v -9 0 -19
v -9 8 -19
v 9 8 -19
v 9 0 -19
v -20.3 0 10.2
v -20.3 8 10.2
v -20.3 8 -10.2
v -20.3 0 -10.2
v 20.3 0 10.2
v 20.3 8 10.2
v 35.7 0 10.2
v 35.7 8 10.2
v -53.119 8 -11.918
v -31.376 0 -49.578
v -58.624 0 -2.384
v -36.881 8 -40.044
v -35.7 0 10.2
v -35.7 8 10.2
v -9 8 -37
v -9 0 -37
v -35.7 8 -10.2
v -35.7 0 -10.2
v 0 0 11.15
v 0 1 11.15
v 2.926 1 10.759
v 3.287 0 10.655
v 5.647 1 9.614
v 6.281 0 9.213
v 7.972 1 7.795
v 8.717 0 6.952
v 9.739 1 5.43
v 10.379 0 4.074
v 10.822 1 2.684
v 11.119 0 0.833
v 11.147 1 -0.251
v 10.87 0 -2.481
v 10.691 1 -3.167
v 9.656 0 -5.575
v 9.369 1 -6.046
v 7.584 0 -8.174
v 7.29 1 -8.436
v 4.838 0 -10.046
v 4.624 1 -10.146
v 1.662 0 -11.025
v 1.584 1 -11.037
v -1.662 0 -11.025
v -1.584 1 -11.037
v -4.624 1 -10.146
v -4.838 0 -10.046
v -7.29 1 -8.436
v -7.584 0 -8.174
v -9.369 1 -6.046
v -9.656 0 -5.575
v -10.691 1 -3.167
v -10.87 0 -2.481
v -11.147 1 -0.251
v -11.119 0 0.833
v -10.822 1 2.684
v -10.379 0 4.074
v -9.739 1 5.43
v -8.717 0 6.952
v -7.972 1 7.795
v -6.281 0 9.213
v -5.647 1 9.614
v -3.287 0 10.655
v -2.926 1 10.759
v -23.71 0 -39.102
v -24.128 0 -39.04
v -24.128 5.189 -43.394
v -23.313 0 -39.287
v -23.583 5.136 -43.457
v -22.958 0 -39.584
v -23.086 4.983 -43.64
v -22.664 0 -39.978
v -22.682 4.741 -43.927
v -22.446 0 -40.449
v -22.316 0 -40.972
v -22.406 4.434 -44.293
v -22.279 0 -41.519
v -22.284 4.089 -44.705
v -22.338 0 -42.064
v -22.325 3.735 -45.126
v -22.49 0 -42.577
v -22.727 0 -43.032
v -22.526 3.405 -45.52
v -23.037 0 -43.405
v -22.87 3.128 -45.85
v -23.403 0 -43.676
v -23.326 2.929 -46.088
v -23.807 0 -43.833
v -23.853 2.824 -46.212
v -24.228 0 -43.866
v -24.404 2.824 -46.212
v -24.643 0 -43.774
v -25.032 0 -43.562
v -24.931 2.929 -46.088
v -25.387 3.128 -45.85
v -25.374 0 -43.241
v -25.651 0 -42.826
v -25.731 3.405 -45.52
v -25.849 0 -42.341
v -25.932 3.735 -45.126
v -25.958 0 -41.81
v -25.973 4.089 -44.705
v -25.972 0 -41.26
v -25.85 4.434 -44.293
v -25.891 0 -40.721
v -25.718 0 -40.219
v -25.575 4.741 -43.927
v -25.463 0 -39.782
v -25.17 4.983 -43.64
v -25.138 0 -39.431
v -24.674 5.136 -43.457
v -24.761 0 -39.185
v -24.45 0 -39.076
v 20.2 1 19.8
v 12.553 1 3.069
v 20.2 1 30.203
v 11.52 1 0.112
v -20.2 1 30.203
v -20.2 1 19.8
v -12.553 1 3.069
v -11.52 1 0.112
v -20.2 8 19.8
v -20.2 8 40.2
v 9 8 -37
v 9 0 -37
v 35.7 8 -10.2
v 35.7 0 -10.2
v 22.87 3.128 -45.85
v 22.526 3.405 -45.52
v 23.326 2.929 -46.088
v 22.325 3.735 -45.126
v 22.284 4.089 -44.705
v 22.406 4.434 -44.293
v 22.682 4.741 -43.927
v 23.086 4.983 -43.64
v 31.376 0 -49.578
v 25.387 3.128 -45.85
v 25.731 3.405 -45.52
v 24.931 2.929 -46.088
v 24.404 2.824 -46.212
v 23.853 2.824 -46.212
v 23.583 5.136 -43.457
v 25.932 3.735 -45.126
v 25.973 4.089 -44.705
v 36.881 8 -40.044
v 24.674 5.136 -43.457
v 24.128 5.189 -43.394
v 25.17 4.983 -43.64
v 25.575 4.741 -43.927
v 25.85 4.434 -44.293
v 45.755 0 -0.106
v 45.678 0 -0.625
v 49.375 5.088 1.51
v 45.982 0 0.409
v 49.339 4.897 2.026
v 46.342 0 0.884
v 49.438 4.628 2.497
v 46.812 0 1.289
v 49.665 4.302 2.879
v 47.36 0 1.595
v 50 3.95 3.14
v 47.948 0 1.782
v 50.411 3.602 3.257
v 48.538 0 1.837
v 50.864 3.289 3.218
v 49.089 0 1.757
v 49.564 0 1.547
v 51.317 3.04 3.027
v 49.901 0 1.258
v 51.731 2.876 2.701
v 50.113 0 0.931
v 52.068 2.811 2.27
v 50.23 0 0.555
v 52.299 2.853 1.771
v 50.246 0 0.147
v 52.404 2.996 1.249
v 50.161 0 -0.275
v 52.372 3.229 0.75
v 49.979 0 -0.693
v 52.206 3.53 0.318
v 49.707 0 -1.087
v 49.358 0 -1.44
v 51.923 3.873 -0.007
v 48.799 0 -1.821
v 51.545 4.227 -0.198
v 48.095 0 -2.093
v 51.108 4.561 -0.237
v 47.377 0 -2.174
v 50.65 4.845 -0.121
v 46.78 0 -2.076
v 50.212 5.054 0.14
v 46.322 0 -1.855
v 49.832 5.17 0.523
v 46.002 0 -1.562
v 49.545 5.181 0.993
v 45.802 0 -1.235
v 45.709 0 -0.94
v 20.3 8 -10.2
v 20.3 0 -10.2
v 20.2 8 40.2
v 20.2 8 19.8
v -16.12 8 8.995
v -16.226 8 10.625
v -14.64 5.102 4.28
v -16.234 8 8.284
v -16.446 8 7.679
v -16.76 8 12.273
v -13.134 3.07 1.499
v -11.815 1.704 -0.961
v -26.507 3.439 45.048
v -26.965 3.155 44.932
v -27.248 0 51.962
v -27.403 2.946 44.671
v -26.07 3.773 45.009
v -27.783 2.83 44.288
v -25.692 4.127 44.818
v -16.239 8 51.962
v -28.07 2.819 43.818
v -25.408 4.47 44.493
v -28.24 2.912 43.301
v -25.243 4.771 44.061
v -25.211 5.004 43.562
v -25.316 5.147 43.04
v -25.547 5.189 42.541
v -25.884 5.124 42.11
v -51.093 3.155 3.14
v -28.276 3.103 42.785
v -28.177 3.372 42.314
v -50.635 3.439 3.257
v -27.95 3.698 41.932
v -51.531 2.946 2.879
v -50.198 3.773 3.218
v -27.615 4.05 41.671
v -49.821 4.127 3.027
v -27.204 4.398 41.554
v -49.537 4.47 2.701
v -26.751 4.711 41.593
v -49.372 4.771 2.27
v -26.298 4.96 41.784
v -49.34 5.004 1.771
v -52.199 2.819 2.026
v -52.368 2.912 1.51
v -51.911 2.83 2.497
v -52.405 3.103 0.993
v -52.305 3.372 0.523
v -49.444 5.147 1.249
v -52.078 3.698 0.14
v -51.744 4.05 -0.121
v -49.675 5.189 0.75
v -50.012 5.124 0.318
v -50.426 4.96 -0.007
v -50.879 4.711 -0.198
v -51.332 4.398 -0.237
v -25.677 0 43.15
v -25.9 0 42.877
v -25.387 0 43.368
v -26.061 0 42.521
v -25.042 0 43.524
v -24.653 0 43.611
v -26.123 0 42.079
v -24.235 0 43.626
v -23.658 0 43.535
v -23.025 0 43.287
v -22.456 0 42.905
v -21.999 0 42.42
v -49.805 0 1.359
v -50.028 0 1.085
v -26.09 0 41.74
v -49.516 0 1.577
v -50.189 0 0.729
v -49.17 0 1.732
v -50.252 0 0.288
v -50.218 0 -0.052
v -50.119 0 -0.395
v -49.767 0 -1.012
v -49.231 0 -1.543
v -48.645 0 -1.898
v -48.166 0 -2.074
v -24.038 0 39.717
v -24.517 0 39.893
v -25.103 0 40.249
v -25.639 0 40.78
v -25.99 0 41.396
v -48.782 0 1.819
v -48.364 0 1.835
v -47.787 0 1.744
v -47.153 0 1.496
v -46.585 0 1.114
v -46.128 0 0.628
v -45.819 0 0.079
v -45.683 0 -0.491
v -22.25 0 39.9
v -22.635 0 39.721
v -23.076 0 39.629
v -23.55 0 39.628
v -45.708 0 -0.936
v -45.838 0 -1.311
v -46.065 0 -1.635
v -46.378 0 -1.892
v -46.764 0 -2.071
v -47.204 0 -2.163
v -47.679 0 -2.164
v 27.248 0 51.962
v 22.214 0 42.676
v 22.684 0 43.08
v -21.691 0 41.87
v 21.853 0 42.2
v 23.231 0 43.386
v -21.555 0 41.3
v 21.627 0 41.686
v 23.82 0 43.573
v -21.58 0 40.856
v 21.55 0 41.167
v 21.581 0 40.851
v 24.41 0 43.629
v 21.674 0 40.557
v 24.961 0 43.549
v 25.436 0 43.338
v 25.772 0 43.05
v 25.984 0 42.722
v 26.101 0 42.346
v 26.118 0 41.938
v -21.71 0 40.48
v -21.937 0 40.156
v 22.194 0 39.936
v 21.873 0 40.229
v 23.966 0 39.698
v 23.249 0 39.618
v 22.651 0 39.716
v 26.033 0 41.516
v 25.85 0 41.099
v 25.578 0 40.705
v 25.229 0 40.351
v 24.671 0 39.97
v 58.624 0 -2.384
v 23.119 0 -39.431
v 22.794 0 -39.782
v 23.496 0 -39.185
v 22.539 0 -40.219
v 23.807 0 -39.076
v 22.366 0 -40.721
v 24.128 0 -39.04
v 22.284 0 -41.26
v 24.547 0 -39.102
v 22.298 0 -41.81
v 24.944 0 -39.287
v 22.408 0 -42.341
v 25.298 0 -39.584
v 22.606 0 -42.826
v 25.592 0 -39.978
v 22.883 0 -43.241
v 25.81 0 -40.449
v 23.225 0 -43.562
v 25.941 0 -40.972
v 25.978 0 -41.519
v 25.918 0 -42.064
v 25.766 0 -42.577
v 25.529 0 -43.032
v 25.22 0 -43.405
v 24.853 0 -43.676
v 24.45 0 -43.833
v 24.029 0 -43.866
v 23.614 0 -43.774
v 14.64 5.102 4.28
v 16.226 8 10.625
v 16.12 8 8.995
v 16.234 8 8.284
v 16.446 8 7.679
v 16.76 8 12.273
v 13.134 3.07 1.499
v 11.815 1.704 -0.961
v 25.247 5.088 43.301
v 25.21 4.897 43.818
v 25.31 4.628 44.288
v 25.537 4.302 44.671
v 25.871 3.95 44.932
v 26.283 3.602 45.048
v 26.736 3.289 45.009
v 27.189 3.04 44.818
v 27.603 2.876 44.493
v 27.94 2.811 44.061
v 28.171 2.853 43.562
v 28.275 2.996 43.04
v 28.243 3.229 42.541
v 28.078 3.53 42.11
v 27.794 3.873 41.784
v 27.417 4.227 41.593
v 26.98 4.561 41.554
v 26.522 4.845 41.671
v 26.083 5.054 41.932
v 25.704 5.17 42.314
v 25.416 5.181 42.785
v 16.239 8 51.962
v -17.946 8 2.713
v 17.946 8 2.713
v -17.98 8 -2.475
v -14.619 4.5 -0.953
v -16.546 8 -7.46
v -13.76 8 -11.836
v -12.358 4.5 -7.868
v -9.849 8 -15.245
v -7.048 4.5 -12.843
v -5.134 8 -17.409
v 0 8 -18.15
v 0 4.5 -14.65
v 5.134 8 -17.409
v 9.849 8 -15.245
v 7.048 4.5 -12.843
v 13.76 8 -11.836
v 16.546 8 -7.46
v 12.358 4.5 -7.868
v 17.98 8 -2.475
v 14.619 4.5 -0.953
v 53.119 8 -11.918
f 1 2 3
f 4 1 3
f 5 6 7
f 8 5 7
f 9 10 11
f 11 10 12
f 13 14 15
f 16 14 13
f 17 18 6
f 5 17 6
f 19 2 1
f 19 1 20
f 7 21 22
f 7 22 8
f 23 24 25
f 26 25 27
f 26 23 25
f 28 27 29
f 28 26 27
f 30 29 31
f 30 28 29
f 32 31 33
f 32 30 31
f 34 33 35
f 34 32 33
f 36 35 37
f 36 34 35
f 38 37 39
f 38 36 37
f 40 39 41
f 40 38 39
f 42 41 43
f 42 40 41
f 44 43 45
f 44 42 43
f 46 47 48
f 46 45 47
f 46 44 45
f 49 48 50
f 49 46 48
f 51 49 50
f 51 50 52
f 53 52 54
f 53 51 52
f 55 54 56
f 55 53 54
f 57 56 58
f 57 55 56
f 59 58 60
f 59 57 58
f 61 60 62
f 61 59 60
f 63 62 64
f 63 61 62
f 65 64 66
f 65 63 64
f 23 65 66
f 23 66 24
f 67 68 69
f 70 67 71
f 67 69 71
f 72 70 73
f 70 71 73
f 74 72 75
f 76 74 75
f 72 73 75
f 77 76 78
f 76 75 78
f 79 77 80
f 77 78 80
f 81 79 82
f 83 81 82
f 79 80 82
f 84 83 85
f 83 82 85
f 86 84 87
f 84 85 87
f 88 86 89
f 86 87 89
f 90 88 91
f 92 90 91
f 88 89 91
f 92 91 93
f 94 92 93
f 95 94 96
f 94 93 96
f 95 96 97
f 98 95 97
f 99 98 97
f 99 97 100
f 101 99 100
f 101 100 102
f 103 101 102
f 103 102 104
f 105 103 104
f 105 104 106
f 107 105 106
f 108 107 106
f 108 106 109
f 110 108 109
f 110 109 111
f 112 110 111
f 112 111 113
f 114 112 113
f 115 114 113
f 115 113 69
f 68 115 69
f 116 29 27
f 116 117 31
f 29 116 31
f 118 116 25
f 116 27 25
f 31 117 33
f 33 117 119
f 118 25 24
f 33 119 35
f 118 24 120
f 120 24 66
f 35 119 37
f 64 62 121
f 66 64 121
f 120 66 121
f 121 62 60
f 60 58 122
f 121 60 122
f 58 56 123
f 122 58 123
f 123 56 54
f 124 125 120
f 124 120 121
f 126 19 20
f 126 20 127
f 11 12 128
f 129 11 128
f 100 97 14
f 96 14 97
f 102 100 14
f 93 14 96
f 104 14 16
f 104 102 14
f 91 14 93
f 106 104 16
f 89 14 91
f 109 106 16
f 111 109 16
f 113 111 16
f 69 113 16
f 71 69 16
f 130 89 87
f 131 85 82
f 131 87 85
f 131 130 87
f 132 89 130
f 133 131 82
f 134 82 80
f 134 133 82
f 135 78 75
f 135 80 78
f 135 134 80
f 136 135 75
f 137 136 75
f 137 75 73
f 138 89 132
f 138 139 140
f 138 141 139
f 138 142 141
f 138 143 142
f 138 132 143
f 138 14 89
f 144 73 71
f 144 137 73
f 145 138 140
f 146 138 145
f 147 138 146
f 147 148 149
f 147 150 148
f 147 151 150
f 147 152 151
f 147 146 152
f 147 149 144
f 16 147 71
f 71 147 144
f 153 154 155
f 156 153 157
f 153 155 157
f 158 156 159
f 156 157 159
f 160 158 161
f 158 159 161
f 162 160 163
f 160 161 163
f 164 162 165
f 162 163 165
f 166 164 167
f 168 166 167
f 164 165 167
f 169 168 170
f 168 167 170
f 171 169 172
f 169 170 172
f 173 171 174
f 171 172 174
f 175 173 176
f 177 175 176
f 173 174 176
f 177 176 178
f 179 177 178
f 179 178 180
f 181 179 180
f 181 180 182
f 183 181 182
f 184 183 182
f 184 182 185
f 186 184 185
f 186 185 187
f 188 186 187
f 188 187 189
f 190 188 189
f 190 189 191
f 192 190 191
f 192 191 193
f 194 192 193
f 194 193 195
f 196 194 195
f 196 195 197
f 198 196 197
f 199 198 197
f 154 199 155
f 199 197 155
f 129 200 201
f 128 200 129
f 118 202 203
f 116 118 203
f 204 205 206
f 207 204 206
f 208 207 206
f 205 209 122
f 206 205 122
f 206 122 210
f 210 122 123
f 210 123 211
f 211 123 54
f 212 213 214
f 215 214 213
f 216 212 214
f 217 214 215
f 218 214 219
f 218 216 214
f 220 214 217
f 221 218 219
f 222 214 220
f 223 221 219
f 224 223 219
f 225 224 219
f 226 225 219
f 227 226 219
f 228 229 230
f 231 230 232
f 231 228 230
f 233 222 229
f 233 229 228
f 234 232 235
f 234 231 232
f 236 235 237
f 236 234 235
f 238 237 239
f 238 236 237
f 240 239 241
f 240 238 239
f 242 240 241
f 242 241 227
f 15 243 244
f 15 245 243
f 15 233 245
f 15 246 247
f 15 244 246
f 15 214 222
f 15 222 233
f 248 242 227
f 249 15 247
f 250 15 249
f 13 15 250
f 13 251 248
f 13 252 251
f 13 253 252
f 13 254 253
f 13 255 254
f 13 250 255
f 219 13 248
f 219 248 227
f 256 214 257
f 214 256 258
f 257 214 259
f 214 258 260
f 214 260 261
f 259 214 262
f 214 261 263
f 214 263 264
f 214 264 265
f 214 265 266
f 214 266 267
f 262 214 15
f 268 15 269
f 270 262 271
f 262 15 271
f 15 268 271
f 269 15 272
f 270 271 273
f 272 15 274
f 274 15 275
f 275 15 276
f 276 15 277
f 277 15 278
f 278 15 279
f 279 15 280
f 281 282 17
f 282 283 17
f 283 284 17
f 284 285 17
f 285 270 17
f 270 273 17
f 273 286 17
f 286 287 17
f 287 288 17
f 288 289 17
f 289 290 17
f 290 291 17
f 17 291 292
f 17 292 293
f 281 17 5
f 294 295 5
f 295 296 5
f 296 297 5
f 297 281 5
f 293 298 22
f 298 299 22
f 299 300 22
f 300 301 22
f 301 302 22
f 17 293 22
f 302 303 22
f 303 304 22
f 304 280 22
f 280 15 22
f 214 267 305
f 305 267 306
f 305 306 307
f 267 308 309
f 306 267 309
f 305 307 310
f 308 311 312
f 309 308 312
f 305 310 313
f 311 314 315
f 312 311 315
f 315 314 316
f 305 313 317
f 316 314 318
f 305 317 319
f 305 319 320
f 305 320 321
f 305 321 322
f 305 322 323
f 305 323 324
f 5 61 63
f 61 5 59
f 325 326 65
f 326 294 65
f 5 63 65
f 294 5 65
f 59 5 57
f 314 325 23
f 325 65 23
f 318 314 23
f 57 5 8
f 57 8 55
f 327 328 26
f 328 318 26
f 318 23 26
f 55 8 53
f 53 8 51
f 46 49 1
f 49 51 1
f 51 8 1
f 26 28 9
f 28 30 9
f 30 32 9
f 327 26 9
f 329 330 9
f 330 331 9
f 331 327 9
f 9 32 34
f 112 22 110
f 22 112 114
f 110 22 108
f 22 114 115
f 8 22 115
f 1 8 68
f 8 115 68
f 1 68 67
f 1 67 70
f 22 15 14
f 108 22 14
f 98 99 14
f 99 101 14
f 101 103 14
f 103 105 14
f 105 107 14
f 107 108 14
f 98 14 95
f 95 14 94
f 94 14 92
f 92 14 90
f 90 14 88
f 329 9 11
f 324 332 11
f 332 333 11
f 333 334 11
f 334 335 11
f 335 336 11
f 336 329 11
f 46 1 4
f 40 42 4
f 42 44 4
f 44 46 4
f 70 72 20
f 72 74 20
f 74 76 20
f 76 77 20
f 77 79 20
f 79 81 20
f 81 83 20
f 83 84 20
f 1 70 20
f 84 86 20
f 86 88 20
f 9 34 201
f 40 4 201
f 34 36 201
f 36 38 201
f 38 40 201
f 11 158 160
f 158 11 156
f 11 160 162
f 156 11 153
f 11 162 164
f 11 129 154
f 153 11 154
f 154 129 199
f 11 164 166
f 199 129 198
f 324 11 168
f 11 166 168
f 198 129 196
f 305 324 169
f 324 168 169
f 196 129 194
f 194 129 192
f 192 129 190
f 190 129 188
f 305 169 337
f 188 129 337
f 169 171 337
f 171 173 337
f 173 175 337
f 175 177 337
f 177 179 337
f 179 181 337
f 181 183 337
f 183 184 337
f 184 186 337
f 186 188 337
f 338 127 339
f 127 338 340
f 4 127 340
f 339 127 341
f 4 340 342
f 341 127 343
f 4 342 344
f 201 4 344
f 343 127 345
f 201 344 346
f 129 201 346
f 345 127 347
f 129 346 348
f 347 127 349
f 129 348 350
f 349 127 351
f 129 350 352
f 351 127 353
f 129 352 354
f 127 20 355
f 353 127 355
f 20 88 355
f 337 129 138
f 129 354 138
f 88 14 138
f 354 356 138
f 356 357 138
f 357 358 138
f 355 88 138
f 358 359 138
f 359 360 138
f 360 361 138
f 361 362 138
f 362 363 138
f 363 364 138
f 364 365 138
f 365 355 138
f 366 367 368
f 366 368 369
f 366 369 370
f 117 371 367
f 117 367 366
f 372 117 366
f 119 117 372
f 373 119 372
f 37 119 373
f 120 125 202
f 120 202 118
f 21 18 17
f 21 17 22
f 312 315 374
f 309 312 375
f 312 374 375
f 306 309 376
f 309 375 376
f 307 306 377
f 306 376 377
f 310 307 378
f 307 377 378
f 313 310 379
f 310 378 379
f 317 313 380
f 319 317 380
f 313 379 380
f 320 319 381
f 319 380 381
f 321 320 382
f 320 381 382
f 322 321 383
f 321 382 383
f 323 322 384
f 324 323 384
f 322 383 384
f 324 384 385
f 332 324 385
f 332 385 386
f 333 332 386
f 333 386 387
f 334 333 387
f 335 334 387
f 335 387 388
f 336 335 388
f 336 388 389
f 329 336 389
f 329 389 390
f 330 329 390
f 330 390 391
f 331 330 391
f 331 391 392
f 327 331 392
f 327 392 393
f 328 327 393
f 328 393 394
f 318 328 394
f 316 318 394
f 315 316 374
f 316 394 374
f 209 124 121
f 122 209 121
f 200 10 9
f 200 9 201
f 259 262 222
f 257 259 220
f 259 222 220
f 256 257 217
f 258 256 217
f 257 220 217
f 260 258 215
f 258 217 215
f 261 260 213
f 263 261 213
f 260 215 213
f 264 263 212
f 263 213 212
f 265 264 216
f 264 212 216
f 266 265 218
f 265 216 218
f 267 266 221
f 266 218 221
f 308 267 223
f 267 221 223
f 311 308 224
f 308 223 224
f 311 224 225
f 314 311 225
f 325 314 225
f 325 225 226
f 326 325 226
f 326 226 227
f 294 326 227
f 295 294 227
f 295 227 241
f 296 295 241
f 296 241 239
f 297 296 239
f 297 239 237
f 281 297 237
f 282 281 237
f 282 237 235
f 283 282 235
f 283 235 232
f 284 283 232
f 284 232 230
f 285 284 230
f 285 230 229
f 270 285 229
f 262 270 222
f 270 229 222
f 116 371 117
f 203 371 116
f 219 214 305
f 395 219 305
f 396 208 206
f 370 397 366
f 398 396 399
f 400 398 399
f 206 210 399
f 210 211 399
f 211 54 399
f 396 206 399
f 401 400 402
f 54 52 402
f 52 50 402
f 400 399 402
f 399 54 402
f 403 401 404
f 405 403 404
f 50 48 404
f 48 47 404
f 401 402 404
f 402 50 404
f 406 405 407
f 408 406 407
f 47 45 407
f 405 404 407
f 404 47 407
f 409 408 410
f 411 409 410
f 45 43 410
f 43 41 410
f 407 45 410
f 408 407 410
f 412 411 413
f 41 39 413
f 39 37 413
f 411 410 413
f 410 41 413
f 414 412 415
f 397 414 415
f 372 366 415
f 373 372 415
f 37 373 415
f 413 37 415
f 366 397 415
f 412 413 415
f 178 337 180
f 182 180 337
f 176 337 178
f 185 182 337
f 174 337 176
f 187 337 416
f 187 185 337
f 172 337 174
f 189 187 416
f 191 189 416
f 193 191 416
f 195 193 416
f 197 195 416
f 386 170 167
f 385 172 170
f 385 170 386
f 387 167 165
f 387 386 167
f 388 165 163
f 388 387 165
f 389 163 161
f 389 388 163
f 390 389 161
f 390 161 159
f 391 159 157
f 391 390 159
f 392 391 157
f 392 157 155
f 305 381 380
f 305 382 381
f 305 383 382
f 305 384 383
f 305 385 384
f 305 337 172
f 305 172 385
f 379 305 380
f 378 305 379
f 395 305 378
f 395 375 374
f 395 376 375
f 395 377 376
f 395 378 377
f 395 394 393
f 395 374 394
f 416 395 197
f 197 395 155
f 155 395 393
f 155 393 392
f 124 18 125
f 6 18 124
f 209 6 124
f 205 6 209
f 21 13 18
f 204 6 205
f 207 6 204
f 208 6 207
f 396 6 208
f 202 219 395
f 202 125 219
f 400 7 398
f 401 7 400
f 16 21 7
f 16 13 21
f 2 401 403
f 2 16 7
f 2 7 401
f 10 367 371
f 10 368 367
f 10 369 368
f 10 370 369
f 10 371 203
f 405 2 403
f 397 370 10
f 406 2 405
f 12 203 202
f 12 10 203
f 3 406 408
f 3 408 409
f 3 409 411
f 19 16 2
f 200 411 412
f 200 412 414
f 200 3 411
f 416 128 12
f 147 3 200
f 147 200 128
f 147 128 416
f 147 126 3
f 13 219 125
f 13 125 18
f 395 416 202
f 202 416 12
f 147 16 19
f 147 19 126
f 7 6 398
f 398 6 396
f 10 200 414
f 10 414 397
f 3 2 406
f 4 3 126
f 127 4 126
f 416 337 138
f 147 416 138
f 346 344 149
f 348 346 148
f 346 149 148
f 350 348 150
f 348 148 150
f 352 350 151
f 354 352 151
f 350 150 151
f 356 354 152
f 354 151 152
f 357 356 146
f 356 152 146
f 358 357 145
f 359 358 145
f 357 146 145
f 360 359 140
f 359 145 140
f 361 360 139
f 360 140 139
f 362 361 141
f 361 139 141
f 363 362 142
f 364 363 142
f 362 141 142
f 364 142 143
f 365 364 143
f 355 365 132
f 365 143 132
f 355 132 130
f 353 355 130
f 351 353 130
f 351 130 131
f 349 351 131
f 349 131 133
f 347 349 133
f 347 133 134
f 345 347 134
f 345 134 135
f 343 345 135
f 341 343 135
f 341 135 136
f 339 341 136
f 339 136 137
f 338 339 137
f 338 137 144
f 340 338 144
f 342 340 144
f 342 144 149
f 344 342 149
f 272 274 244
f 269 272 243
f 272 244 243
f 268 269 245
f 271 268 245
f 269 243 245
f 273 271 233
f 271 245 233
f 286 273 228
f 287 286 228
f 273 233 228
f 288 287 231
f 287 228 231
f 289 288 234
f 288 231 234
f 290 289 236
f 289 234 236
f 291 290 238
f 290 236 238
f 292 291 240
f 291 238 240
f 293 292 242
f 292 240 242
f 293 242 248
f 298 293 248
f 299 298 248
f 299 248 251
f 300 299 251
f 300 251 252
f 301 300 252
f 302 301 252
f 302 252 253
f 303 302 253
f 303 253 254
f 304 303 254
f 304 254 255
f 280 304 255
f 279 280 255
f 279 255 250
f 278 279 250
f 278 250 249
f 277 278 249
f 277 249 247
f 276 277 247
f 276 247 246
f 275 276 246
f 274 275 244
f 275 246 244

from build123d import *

# Parameters (mm, degrees)
BOSS_EXTRUDE1_DEPTH = 8
CHAMFER1_SIZE       = 10
CHAMFER1_SIZE_2     = 11.917535926
SKETCH4_R           = 1.85
CUT_EXTRUDE1_DEPTH  = 101.029376687
SKETCH5_R           = 11.15
CUT_EXTRUDE3_DEPTH  = 79.744901298
SKETCH6_R           = 1.85
CUT_EXTRUDE4_DEPTH  = 101.029376687
SKETCH7_R           = 1.85
CUT_EXTRUDE5_DEPTH  = 97.338690096
SKETCH8_W           = 15.4
SKETCH8_H           = 20.4
CUT_EXTRUDE6_DEPTH  = 79.744901298
SKETCH9_W           = 40.4
SKETCH9_H           = 10.4
CUT_EXTRUDE7_DEPTH  = 7
CUT_EXTRUDE8_DEPTH  = 7
CHAMFER2_SIZE       = 7
CHAMFER3_SIZE       = 10
CHAMFER3_SIZE_2     = 7.002075382
FILLET1_R           = 3
SKETCH11_W          = 18
SKETCH11_H          = 18
CUT_EXTRUDE9_DEPTH  = 79.744901364


with BuildPart() as part:
    # Sketch1 → Boss-Extrude1 (new body)
    with BuildSketch(Plane(origin=(0, 0, 0), x_dir=(1, 0, 0), z_dir=(0, 1, 0))):
        Polygon((-60, 0), (-30, -51.961524227), (30, -51.961524227), (60, 0), (30, 51.961524227), (-30, 51.961524227), align=None)
    extrude(amount=BOSS_EXTRUDE1_DEPTH)

    # Chamfer1
    # the kernel refuses this chamfer: 11.917535926, 10 mm, written as the material it takes off along each edge
    with BuildSketch(Plane(origin=(60.716329832, 8, -51.961524227), x_dir=(0, -0.9993728857116146, -0.0354095369136628), z_dir=(-1, 0, 0)), Plane(origin=(-75.358164916, 8, -26.601121946), x_dir=(-0.030665558503474466, -0.9993728857116146, 0.017704768456831187), z_dir=(0.4999999999999998, 0, 0.8660254037844388)), Plane(origin=(14.641835084, 8, 78.562646173), x_dir=(0.03066555850347504, -0.9993728857116146, 0.017704768456831523), z_dir=(0.4999999999999999, 0, -0.8660254037844388))) as chamfer1_piece_1:
        Polygon((CHAMFER1_SIZE * 0.999372885712, CHAMFER1_SIZE * 0.0354095369137), (-CHAMFER1_SIZE_2 * 0.0354095369135, CHAMFER1_SIZE_2 * 0.999372885707), (0, 0), align=None)
    extrude(amount=121.432659665, mode=Mode.SUBTRACT)

    # Sketch4 → Cut-Extrude1 (cut, through all)
    with BuildSketch(Plane(origin=(17.740047471, 24.412407781, 10.242221183), x_dir=(0.8301060005968394, -0.4979011414928883, -0.251034820439713), z_dir=(0.5566703992264198, 0.7660444431189777, 0.3213938048432698))):
        with Locations(Location((39.858257334, -1.394557769, 0), (0, 0, 164.627134315))):
            Circle(SKETCH4_R)
        with Locations(Location((9.338033447, -38.774045448, 0), (0, 0, 164.627134315))):
            Circle(SKETCH4_R)
    extrude(amount=-CUT_EXTRUDE1_DEPTH, mode=Mode.SUBTRACT)

    # Sketch5 → Cut-Extrude3 (cut, through all)
    with BuildSketch(Plane(origin=(0, 0, 0), x_dir=(1, 0, 0), z_dir=(0, 1, 0))):
        with Locations(Location((0, 0, 0), (0, 0, 270))):
            Circle(SKETCH5_R)
    extrude(amount=CUT_EXTRUDE3_DEPTH, mode=Mode.SUBTRACT)

    # Sketch6 → Cut-Extrude4 (cut, through all)
    with BuildSketch(Plane(origin=(-17.740047471, 24.412407781, 10.242221183), x_dir=(0.8307334510088673, 0.5133226132381532, 0.21536440772154375), z_dir=(-0.5566703992264165, 0.7660444431189809, 0.3213938048432678))):
        with Locations(Location((-39.882343662, 0.155348314, 0), (0, 0, 193.145847187))):
            Circle(SKETCH6_R)
        with Locations(Location((-10.837701827, -38.381892712, 0), (0, 0, 193.145847187))):
            Circle(SKETCH6_R)
    extrude(amount=-CUT_EXTRUDE4_DEPTH, mode=Mode.SUBTRACT)

    # Sketch7 → Cut-Extrude5 (cut, through all)
    with BuildSketch(Plane(origin=(0, 24.412407781, -20.484442365), x_dir=(1, 0, 0), z_dir=(0, 0.7660444431189811, -0.6427876096865357))):
        with Locations(Location((-24.128355545, 31.756069148, 0), (0, 0, 270))):
            Circle(SKETCH7_R)
        with Locations(Location((24.128355545, 31.756069148, 0), (0, 0, 270))):
            Circle(SKETCH7_R)
    extrude(amount=-CUT_EXTRUDE5_DEPTH, mode=Mode.SUBTRACT)

    # Sketch8 → Cut-Extrude6 (cut, through all)
    with BuildSketch(Plane(origin=(0, 8, 0), x_dir=(1, 0, 0), z_dir=(0, 1, 0))):
        with Locations((-28, 0)):
            Rectangle(SKETCH8_W, SKETCH8_H)
        with Locations((28, 0)):
            Rectangle(SKETCH8_W, SKETCH8_H)
    extrude(amount=-CUT_EXTRUDE6_DEPTH, mode=Mode.SUBTRACT)

    # Sketch9 → Cut-Extrude7 (cut)
    with BuildSketch(Plane(origin=(0, 8, 0), x_dir=(1, 0, 0), z_dir=(0, 1, 0))):
        with Locations((0, -25)):
            Rectangle(SKETCH9_W, SKETCH9_H)
    extrude(amount=-CUT_EXTRUDE7_DEPTH, mode=Mode.SUBTRACT)

    # Sketch10 → Cut-Extrude8 (cut)
    with BuildSketch(Plane(origin=(0, 8, 0), x_dir=(1, 0, 0), z_dir=(0, 1, 0))):
        Polygon((-20.2, -19.8), (-11.15, 0), (11.15, 0), (20.2, -19.8), align=None)
    extrude(amount=-CUT_EXTRUDE8_DEPTH, mode=Mode.SUBTRACT)

    # Chamfer2
    chamfer2_edges = [part.edges().sort_by_distance(p)[0] for p in [
        (0, 8, -11.15),
    ]]
    chamfer(chamfer2_edges, length=CHAMFER2_SIZE)

    # Chamfer3
    # the kernel refuses this chamfer: 10, 7.002075382 mm, written as the material it takes off along each edge
    with BuildSketch(Plane(origin=(20.2, 8, 30.2), x_dir=(0, 0.02220967419845712, 0.9997533347641299), z_dir=(-1, 0, 0))) as chamfer3_piece_1_section:
        Polygon((CHAMFER3_SIZE * 0.999753334764, -CHAMFER3_SIZE * 0.0222096741985), (-CHAMFER3_SIZE_2 * 0.0222096741988, -CHAMFER3_SIZE_2 * 0.999753334778), (0, 0), align=None)
    chamfer3_piece_1 = extrude(amount=40.4, mode=Mode.PRIVATE)
    chamfer3_piece_1 = split(chamfer3_piece_1, bisect_by=Plane(origin=(0, 1, 33.539189969), z_dir=(0, 1, 0)), keep=Keep.TOP, mode=Mode.PRIVATE)
    add(chamfer3_piece_1, mode=Mode.SUBTRACT)

    # Fillet1
    fillet1_edges = [part.edges().sort_by_distance(p)[0] for p in [
        (-13.4116744, 4.145370972, 4.948193714),
        (13.4116744, 4.145370972, 4.948193714),
    ]]
    fillet(fillet1_edges, radius=FILLET1_R)

    # Sketch11 → Cut-Extrude9 (cut, through all)
    with BuildSketch(Plane(origin=(0, 8, 0), x_dir=(1, 0, 0), z_dir=(0, 1, 0))):
        with Locations((0, 28)):
            Rectangle(SKETCH11_W, SKETCH11_H)
    extrude(amount=-CUT_EXTRUDE9_DEPTH, mode=Mode.SUBTRACT)


solid = part.part
